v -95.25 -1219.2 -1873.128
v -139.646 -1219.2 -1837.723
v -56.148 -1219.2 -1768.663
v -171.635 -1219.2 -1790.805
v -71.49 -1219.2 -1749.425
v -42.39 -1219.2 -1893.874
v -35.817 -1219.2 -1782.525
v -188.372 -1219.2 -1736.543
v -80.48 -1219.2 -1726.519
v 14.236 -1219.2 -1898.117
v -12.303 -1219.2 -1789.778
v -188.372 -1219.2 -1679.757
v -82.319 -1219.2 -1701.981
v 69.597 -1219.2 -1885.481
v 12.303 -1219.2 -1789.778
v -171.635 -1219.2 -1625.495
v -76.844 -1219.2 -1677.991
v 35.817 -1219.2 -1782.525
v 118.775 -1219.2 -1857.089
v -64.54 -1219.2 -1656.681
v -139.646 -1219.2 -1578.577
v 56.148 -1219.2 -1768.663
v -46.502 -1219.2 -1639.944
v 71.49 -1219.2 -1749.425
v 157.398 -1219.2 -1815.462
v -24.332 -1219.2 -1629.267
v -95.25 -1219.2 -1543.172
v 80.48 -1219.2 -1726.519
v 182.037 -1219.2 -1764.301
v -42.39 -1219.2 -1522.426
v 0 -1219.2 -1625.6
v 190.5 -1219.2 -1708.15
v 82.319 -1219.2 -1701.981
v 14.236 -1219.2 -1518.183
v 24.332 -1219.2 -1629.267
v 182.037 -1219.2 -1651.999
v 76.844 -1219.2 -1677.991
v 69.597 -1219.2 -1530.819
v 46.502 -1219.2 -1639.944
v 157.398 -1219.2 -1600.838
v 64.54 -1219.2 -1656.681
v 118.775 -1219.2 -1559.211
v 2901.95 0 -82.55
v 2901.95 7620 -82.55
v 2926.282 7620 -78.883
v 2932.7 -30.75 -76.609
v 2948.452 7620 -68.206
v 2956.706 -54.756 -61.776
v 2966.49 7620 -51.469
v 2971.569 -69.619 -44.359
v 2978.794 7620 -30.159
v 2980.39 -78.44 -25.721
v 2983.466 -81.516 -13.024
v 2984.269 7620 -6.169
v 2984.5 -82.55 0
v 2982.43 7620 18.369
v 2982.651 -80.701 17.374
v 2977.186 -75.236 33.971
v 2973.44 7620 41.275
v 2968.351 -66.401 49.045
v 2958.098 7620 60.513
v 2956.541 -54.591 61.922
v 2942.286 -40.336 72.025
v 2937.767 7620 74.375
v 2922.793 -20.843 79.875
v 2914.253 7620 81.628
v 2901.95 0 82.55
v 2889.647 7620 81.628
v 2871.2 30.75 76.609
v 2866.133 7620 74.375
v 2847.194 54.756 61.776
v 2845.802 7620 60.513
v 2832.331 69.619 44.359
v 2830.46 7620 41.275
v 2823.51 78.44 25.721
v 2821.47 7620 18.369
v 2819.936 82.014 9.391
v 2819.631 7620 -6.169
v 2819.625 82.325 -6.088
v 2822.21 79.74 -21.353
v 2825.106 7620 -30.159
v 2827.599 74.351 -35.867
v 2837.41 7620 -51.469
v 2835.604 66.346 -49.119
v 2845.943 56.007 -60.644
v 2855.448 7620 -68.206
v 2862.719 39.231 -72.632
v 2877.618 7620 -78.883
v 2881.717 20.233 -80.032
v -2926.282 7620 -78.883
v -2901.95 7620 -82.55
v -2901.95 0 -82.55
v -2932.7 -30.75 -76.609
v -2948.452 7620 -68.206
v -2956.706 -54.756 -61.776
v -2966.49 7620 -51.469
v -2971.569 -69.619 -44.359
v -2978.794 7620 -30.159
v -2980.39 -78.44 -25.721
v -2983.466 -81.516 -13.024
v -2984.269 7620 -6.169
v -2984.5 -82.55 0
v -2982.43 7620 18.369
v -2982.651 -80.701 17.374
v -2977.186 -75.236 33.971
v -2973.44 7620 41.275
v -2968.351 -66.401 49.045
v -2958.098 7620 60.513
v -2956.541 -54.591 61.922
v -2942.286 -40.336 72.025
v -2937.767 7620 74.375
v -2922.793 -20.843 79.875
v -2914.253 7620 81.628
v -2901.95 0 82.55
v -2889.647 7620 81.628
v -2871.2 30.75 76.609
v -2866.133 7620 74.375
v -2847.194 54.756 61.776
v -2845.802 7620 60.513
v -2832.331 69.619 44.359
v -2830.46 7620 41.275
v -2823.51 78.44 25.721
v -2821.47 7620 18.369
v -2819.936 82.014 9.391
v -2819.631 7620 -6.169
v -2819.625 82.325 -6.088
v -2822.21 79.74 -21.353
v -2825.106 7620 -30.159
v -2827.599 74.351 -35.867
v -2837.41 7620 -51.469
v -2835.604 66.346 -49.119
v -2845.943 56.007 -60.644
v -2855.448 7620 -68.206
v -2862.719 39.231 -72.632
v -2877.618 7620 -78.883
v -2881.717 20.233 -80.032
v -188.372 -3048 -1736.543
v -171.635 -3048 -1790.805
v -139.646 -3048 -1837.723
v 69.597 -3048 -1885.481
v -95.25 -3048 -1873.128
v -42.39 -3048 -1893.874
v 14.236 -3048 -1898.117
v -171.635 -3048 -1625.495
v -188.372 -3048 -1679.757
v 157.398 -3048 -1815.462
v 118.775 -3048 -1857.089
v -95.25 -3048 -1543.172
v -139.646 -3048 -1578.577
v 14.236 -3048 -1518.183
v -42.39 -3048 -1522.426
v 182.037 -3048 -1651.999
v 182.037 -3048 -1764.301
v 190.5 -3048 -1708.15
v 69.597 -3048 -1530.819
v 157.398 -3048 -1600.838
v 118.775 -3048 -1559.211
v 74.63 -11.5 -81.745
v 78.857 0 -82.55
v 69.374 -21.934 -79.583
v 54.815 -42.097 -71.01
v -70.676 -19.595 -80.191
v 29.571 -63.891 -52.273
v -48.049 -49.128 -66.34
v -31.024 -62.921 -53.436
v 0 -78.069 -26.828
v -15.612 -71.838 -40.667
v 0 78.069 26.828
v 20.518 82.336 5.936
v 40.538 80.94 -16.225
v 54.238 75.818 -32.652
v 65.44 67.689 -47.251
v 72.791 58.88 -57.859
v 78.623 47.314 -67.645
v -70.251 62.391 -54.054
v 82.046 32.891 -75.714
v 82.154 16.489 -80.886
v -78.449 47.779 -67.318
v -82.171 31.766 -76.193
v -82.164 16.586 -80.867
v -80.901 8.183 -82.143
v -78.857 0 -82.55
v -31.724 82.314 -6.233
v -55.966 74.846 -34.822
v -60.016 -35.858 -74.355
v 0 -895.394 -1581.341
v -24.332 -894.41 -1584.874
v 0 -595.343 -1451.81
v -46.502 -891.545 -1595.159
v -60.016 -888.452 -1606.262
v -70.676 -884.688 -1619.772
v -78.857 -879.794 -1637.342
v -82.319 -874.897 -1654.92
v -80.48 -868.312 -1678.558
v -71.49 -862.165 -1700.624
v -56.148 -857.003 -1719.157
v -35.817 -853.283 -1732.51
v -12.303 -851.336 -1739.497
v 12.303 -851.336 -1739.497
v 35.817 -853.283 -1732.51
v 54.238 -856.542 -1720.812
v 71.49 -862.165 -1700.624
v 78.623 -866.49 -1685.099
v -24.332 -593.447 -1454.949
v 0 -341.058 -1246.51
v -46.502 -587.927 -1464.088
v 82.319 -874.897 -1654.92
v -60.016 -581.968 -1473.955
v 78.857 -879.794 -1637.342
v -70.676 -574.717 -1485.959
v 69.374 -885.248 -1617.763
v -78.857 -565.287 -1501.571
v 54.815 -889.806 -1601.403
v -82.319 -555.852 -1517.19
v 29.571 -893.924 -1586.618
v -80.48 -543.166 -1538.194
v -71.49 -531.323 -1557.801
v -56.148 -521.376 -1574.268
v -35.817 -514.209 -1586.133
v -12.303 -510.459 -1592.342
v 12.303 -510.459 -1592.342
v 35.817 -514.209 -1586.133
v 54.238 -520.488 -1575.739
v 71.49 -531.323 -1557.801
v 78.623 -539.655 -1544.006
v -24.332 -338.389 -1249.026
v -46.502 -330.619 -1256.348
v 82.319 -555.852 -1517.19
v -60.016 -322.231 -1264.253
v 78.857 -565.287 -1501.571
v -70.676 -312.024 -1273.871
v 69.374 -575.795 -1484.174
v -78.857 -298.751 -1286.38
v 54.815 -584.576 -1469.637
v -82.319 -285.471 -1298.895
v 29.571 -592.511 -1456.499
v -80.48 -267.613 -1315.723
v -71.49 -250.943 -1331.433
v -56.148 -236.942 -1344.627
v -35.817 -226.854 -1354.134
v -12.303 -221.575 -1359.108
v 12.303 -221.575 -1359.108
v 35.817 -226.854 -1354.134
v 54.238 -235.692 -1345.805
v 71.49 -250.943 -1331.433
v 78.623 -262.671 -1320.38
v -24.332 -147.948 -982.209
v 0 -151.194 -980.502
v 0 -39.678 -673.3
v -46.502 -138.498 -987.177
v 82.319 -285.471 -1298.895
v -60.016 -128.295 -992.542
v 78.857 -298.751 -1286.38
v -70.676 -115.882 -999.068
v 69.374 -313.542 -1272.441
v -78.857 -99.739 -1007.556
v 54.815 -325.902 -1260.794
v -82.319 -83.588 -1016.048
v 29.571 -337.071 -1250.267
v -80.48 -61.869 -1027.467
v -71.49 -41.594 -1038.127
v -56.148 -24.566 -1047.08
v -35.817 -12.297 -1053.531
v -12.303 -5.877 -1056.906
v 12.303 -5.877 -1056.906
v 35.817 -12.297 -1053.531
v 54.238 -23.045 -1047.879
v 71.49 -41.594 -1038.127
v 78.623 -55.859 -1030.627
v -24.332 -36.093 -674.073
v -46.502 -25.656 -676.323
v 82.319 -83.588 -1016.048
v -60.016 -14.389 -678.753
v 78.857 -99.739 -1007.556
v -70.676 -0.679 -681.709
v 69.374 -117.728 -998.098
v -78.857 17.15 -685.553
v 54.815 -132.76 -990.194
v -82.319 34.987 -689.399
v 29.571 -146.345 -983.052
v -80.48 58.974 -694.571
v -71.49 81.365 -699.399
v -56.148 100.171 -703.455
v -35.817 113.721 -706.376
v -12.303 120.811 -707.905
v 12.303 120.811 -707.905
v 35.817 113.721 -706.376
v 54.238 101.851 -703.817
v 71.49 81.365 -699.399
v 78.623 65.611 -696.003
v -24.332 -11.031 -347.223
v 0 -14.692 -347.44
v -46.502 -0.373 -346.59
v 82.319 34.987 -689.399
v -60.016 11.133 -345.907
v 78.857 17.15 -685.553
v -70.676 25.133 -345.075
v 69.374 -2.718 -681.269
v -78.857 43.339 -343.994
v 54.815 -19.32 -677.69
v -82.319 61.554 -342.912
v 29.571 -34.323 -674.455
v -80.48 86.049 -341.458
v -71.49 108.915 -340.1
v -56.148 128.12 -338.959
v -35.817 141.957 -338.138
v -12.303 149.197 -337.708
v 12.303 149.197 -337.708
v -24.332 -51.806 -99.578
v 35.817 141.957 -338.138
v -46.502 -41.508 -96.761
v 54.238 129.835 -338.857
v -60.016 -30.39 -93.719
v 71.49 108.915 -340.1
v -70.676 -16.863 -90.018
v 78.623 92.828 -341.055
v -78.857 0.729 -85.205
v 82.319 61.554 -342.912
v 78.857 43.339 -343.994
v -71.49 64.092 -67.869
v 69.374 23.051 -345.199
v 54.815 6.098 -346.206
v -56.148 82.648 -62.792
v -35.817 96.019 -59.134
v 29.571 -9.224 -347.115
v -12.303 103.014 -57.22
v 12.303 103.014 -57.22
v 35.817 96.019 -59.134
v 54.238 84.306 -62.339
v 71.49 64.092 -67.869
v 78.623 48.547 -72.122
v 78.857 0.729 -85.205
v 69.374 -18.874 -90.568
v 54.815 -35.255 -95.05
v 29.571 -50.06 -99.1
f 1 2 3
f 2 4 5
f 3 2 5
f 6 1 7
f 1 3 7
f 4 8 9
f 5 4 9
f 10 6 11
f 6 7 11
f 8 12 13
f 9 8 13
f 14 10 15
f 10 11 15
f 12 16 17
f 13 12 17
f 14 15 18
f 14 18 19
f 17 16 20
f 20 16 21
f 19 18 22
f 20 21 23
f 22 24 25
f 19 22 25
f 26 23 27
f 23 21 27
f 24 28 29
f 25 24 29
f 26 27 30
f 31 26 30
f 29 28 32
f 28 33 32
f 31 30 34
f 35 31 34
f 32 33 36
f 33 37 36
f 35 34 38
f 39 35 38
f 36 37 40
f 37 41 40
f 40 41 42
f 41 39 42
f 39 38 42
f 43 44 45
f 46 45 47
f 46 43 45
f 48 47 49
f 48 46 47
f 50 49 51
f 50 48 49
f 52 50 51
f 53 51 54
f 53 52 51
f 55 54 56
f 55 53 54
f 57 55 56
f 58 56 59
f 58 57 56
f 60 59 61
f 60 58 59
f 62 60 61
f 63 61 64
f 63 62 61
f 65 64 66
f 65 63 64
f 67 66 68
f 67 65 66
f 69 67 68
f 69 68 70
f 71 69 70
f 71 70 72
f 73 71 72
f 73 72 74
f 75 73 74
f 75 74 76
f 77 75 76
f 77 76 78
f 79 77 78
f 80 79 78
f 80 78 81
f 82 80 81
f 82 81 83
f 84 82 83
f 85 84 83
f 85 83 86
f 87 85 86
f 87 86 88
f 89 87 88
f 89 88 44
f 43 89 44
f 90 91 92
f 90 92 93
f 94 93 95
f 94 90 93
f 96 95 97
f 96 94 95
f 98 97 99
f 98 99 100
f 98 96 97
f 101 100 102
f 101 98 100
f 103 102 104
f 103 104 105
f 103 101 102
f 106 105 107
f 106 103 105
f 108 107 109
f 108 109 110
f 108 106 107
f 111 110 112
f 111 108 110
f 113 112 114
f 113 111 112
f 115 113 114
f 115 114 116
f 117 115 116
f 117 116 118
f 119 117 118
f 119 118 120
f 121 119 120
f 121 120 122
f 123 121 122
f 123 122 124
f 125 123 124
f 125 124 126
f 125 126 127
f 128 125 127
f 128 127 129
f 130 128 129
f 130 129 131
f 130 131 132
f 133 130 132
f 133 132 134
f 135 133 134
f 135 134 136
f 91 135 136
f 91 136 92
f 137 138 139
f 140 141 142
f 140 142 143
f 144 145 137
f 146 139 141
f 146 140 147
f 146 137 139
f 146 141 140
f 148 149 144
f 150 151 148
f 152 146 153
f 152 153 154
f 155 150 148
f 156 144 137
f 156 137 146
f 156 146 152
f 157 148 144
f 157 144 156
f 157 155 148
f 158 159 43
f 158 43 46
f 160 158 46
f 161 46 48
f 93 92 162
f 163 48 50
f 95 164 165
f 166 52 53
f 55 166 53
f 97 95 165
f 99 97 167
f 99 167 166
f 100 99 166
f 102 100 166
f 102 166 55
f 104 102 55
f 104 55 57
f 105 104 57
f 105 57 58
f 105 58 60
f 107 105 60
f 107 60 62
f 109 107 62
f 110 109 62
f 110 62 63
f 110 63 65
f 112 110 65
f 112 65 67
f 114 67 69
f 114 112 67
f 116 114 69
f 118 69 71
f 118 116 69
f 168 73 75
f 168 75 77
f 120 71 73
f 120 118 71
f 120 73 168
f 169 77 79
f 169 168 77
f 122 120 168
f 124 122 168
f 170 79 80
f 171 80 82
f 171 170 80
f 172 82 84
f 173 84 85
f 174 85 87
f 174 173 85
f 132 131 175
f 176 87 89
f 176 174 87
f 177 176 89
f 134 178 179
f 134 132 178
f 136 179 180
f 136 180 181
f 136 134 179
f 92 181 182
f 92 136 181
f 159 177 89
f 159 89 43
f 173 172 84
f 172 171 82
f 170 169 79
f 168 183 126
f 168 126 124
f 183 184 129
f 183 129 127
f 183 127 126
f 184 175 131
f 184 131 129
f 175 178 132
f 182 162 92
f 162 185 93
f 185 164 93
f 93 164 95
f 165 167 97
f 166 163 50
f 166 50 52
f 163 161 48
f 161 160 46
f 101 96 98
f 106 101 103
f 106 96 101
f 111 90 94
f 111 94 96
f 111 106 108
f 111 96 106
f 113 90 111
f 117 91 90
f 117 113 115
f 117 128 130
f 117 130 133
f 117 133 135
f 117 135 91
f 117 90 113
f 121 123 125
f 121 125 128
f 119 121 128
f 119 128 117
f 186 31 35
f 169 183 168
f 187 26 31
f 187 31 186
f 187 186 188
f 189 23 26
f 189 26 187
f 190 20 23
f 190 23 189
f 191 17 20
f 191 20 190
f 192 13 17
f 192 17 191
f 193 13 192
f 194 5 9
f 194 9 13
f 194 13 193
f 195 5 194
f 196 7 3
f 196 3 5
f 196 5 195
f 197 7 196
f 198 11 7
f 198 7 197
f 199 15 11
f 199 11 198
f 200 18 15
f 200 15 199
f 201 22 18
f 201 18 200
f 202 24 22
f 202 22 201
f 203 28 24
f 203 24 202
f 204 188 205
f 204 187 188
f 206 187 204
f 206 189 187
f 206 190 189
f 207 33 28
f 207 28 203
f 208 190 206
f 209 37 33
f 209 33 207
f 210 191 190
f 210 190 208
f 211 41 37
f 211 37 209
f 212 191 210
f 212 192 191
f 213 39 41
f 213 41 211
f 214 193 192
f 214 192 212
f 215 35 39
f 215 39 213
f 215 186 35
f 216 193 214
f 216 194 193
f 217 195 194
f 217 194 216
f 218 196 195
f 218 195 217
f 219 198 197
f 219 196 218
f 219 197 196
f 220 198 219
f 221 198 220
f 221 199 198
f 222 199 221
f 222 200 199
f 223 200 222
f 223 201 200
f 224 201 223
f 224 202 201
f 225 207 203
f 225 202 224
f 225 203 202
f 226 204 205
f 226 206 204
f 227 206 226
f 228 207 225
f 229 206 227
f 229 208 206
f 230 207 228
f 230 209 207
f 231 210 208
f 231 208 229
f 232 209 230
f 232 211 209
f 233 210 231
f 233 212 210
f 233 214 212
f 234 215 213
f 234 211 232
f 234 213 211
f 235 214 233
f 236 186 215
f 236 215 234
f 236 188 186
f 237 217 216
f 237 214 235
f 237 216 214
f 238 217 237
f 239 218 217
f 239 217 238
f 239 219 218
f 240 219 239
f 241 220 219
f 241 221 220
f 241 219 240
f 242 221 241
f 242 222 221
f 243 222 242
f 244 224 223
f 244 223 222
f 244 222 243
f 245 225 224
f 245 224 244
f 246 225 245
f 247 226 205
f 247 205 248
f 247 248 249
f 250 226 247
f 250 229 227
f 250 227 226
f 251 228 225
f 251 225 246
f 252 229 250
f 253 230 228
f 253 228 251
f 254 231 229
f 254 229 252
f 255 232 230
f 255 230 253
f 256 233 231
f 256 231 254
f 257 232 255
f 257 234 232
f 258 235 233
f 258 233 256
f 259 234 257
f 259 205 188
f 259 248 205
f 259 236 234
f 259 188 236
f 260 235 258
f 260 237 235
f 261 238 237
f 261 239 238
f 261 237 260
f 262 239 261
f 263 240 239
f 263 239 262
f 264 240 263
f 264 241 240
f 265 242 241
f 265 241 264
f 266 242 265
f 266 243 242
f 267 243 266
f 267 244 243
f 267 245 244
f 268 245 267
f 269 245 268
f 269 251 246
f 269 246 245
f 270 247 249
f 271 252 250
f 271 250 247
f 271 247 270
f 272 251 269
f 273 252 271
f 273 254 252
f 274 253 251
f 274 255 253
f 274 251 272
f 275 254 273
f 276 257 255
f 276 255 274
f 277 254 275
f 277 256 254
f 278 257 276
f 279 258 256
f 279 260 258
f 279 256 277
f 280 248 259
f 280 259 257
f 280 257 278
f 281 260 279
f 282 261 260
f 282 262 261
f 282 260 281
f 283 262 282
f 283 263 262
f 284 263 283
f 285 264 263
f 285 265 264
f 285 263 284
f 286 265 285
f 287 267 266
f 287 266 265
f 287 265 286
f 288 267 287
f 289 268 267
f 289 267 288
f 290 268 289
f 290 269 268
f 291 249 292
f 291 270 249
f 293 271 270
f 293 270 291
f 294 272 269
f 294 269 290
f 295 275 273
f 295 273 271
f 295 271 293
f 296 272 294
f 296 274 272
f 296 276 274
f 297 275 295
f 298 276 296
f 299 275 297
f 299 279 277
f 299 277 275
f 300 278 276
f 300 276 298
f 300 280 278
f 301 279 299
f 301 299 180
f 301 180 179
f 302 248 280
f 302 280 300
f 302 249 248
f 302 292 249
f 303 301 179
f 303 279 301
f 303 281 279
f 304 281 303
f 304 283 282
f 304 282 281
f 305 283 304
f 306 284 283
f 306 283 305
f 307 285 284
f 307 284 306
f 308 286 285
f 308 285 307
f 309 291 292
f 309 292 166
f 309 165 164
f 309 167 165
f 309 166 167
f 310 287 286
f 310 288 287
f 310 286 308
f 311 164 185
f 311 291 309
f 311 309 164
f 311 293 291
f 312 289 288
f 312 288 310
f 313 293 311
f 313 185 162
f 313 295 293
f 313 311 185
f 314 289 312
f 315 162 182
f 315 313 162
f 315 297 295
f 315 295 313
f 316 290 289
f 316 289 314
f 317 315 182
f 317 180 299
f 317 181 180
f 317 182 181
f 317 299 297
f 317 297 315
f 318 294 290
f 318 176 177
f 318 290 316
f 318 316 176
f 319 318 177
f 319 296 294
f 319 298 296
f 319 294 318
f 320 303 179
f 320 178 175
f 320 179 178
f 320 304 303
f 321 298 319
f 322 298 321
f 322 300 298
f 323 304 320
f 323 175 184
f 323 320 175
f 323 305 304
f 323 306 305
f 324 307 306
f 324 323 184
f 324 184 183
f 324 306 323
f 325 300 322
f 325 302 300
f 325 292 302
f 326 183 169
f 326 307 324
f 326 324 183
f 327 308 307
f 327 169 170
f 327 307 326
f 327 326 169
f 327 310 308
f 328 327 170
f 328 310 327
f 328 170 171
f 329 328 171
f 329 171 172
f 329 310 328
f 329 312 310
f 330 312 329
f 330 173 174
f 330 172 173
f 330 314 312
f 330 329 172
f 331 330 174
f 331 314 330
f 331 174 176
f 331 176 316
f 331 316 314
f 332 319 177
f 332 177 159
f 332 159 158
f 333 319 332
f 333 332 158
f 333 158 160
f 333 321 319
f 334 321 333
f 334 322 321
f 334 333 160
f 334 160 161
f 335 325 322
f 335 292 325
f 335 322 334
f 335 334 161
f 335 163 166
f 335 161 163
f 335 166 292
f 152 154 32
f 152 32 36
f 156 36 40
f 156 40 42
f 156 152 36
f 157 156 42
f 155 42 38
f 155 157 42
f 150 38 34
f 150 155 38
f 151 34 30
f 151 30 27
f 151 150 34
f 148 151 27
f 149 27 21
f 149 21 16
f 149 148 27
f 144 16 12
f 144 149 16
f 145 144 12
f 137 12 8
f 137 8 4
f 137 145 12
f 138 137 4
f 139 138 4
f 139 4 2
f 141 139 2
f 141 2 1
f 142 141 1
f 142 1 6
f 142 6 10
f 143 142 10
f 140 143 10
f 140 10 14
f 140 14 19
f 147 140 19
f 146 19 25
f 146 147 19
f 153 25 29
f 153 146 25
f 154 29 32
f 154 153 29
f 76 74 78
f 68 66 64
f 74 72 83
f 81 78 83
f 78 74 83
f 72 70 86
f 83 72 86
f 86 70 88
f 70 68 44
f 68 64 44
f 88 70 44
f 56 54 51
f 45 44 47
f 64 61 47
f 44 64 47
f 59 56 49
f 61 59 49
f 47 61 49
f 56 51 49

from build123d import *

# Parameters (mm, degrees)
SWEEP4_PROFILE_R    = 82.55
SWEEP6_PROFILE_R    = 82.55
SKETCH69_R          = 190.5
BOSS_EXTRUDE3_DEPTH = 1828.8


with BuildPart() as part:
    # Sweep4: sweep along a path in Sketch1
    with BuildLine(Plane.XY) as sweep4_path:
        Line((2901.95, 7620), (2901.95, 0))
        Line((2901.95, 0), (0, 0))
        Line((0, 0), (-2901.95, 0))
        Line((-2901.95, 0), (-2901.95, 7620))
    # Sweep4 profile (on start of the path) → Sweep4 (sweep)
    with BuildSketch(Plane(origin=(2901.95, 7620, 0), x_dir=(0, 0, -1), z_dir=(0, -1, 0))):
        Circle(SWEEP4_PROFILE_R)
    sweep(path=sweep4_path.line, transition=Transition.RIGHT)

    # Sweep6: sweep along a path in Sketch23
    with BuildLine(Plane(origin=(0, 0, 0), x_dir=(0, 0, -1), z_dir=(1, 0, 0))) as sweep6_path:
        Line((1708.15, -3048), (1708.15, -1219.2))
        ThreePointArc((1708.15, -1219.2), (1167.92168471, -169.887717777), (0, 0))
    # Sweep6 profile (on start of the path) → Sweep6 (sweep)
    with BuildSketch(Plane(origin=(0, -3048, -1708.15), x_dir=(0, 0, 1), z_dir=(0, 1, 0))):
        Circle(SWEEP6_PROFILE_R)
    sweep(path=sweep6_path.line)

    # Sketch69 → Boss-Extrude3 (add)
    with BuildSketch(Plane.XZ.offset(3048)):
        with Locations((0, -1708.15)):
            Circle(SKETCH69_R)
    extrude(amount=-BOSS_EXTRUDE3_DEPTH)


solid = part.part
